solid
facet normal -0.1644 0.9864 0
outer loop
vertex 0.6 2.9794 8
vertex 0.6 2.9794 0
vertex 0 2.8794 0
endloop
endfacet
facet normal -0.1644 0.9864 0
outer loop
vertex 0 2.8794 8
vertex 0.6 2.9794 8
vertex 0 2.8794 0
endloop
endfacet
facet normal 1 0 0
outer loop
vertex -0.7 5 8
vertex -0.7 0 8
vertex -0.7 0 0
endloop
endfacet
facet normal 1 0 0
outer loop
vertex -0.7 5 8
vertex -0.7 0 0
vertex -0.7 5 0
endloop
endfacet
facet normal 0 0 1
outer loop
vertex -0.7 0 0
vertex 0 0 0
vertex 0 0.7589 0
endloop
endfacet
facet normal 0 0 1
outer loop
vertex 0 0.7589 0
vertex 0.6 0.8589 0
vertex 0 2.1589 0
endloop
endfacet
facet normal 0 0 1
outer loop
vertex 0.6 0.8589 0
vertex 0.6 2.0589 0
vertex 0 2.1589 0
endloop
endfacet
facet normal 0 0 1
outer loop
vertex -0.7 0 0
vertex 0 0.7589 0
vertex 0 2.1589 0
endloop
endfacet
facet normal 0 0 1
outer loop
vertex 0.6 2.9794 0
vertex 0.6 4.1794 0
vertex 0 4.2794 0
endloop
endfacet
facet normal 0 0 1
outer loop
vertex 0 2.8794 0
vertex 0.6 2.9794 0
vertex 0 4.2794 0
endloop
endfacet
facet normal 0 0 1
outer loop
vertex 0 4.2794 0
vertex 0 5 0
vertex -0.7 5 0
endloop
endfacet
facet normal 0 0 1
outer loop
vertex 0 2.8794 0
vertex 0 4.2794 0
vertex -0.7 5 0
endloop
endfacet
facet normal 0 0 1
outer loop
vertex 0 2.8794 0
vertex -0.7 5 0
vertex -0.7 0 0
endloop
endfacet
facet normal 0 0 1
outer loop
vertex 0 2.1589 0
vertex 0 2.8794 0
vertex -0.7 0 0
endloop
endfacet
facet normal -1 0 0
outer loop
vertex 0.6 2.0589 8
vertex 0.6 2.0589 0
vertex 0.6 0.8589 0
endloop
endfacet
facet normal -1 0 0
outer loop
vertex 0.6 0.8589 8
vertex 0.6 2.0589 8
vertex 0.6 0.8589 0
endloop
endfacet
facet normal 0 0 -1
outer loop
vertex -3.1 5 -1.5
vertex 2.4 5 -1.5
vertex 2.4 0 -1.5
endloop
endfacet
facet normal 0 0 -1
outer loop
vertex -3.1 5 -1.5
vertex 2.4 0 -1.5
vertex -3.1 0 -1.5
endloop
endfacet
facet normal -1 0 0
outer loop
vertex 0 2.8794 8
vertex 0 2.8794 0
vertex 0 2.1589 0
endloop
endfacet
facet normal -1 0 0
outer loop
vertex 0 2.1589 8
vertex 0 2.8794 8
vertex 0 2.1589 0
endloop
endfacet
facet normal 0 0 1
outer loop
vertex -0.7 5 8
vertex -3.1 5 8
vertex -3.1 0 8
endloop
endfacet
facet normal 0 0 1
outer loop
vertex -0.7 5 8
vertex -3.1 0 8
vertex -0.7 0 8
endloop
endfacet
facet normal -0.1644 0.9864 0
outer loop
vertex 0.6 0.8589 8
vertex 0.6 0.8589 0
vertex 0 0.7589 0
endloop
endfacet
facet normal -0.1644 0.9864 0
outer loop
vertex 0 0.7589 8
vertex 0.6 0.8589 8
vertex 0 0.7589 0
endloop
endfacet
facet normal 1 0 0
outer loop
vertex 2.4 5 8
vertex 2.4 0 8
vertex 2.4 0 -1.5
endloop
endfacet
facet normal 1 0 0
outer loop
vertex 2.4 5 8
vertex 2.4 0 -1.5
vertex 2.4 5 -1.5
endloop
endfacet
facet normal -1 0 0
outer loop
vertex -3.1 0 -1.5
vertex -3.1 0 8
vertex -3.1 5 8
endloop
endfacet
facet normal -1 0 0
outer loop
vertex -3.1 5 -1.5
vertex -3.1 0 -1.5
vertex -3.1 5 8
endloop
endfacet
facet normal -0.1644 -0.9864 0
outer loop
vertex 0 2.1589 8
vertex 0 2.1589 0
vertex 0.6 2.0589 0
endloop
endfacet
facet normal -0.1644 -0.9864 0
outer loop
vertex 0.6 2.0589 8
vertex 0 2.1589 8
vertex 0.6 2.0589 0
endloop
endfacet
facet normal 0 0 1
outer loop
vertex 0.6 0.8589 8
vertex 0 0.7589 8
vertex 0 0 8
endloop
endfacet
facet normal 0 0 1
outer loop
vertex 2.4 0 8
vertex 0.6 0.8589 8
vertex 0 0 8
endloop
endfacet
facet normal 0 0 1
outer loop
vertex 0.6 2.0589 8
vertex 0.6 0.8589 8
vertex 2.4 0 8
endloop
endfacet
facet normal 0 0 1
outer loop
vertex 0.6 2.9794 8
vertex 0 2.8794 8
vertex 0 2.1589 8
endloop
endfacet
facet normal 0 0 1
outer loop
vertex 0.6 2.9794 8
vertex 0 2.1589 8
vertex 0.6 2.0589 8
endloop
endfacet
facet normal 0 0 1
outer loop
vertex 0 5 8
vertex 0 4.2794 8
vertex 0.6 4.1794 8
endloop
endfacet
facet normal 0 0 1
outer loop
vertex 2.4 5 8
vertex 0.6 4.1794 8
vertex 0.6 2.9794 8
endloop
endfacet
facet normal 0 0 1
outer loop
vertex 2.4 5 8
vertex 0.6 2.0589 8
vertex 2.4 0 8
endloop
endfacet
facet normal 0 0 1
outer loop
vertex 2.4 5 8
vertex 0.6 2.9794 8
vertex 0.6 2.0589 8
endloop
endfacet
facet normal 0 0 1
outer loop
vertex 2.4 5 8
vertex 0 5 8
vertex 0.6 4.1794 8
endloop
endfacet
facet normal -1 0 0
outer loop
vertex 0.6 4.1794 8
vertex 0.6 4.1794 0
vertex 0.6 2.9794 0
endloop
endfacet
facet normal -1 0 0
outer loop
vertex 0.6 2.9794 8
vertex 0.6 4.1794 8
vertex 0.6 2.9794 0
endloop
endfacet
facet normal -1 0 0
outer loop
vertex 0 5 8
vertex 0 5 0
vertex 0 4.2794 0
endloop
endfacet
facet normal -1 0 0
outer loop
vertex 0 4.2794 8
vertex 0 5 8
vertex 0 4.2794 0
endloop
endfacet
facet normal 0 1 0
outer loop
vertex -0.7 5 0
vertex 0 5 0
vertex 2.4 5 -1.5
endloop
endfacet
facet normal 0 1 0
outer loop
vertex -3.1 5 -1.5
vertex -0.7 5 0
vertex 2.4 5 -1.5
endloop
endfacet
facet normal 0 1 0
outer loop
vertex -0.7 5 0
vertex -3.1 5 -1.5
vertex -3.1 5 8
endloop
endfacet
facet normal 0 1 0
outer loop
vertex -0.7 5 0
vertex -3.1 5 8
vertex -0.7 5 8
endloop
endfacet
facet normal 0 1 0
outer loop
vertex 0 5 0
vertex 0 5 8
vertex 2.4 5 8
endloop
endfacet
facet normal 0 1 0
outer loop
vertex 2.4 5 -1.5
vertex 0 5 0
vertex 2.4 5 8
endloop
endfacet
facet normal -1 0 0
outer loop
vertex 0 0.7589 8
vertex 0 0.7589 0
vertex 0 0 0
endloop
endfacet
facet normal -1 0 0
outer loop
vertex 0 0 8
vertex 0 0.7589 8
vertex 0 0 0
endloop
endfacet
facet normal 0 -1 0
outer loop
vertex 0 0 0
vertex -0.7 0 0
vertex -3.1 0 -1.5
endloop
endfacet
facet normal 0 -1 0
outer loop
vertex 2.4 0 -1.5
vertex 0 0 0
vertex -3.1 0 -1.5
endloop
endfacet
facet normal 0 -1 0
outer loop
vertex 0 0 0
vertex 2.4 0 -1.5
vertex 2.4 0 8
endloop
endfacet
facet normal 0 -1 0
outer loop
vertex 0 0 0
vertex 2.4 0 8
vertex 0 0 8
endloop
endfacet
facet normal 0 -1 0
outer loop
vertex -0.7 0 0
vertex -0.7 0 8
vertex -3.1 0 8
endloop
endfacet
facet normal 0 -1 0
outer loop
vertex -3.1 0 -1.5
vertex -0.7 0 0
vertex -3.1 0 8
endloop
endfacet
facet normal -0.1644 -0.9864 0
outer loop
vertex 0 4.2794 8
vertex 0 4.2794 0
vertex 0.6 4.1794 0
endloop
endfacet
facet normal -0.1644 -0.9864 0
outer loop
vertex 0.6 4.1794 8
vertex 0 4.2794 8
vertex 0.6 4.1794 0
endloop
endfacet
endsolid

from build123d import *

# Parameters (mm, degrees)
SALIENTE_EXTRUIR1_DEPTH   = 8
CROQUIS1_W                = 2.4
CROQUIS1_H                = 7.15885354
SALIENTE_EXTRUIR1_2_DEPTH = 8
CROQUIS2_W                = 5.5
CROQUIS2_H                = 7.15885354
SALIENTE_EXTRUIR2_DEPTH   = 1.5
CROQUIS3_W                = 5.5
CROQUIS3_H                = 2.15885354
CORTAR_EXTRUIR1_DEPTH     = 10.5


with BuildPart() as part:
    # Croquis1 → Saliente-Extruir1 (new body)
    with BuildSketch(Plane.XY):
        Polygon((0, 7.15885354), (0, 6.4), (0.6, 6.3), (0.6, 5.1), (0, 5), (0, 4.279426768), (0.6, 4.179426768), (0.6, 2.979426768), (0, 2.879426768), (0, 2.158853536), (0.6, 2.058853536), (0.6, 0.858853536), (0, 0.758853536), (0, 0), (2.4, 0), (2.4, 7.15885354), align=None)
    extrude(amount=SALIENTE_EXTRUIR1_DEPTH)



with BuildPart() as body_2:
    # Croquis1 → Saliente-Extruir1 2 (new body)
    with BuildSketch(Plane.XY):
        with Locations((-1.9, 3.57942677)):
            Rectangle(CROQUIS1_W, CROQUIS1_H)
    extrude(amount=SALIENTE_EXTRUIR1_2_DEPTH)


with BuildPart() as part_1:
    add(part.part)

    add(body_2.part)  # Saliente-Extruir2 merges body 2
    # Croquis2 → Saliente-Extruir2 (add)
    with BuildSketch(Plane(origin=(0, 0, 0), x_dir=(-1, 0, 0), z_dir=(0, 0, -1))):
        with Locations((0.35, 3.57942677)):
            Rectangle(CROQUIS2_W, CROQUIS2_H)
    extrude(amount=SALIENTE_EXTRUIR2_DEPTH)

    # Croquis3 → Cortar-Extruir1 (cut, through all)
    with BuildSketch(Plane.XY.offset(8)):
        with Locations((-0.35, 6.07942677)):
            Rectangle(CROQUIS3_W, CROQUIS3_H)
    extrude(amount=-CORTAR_EXTRUIR1_DEPTH, mode=Mode.SUBTRACT)


solid = part_1.part
